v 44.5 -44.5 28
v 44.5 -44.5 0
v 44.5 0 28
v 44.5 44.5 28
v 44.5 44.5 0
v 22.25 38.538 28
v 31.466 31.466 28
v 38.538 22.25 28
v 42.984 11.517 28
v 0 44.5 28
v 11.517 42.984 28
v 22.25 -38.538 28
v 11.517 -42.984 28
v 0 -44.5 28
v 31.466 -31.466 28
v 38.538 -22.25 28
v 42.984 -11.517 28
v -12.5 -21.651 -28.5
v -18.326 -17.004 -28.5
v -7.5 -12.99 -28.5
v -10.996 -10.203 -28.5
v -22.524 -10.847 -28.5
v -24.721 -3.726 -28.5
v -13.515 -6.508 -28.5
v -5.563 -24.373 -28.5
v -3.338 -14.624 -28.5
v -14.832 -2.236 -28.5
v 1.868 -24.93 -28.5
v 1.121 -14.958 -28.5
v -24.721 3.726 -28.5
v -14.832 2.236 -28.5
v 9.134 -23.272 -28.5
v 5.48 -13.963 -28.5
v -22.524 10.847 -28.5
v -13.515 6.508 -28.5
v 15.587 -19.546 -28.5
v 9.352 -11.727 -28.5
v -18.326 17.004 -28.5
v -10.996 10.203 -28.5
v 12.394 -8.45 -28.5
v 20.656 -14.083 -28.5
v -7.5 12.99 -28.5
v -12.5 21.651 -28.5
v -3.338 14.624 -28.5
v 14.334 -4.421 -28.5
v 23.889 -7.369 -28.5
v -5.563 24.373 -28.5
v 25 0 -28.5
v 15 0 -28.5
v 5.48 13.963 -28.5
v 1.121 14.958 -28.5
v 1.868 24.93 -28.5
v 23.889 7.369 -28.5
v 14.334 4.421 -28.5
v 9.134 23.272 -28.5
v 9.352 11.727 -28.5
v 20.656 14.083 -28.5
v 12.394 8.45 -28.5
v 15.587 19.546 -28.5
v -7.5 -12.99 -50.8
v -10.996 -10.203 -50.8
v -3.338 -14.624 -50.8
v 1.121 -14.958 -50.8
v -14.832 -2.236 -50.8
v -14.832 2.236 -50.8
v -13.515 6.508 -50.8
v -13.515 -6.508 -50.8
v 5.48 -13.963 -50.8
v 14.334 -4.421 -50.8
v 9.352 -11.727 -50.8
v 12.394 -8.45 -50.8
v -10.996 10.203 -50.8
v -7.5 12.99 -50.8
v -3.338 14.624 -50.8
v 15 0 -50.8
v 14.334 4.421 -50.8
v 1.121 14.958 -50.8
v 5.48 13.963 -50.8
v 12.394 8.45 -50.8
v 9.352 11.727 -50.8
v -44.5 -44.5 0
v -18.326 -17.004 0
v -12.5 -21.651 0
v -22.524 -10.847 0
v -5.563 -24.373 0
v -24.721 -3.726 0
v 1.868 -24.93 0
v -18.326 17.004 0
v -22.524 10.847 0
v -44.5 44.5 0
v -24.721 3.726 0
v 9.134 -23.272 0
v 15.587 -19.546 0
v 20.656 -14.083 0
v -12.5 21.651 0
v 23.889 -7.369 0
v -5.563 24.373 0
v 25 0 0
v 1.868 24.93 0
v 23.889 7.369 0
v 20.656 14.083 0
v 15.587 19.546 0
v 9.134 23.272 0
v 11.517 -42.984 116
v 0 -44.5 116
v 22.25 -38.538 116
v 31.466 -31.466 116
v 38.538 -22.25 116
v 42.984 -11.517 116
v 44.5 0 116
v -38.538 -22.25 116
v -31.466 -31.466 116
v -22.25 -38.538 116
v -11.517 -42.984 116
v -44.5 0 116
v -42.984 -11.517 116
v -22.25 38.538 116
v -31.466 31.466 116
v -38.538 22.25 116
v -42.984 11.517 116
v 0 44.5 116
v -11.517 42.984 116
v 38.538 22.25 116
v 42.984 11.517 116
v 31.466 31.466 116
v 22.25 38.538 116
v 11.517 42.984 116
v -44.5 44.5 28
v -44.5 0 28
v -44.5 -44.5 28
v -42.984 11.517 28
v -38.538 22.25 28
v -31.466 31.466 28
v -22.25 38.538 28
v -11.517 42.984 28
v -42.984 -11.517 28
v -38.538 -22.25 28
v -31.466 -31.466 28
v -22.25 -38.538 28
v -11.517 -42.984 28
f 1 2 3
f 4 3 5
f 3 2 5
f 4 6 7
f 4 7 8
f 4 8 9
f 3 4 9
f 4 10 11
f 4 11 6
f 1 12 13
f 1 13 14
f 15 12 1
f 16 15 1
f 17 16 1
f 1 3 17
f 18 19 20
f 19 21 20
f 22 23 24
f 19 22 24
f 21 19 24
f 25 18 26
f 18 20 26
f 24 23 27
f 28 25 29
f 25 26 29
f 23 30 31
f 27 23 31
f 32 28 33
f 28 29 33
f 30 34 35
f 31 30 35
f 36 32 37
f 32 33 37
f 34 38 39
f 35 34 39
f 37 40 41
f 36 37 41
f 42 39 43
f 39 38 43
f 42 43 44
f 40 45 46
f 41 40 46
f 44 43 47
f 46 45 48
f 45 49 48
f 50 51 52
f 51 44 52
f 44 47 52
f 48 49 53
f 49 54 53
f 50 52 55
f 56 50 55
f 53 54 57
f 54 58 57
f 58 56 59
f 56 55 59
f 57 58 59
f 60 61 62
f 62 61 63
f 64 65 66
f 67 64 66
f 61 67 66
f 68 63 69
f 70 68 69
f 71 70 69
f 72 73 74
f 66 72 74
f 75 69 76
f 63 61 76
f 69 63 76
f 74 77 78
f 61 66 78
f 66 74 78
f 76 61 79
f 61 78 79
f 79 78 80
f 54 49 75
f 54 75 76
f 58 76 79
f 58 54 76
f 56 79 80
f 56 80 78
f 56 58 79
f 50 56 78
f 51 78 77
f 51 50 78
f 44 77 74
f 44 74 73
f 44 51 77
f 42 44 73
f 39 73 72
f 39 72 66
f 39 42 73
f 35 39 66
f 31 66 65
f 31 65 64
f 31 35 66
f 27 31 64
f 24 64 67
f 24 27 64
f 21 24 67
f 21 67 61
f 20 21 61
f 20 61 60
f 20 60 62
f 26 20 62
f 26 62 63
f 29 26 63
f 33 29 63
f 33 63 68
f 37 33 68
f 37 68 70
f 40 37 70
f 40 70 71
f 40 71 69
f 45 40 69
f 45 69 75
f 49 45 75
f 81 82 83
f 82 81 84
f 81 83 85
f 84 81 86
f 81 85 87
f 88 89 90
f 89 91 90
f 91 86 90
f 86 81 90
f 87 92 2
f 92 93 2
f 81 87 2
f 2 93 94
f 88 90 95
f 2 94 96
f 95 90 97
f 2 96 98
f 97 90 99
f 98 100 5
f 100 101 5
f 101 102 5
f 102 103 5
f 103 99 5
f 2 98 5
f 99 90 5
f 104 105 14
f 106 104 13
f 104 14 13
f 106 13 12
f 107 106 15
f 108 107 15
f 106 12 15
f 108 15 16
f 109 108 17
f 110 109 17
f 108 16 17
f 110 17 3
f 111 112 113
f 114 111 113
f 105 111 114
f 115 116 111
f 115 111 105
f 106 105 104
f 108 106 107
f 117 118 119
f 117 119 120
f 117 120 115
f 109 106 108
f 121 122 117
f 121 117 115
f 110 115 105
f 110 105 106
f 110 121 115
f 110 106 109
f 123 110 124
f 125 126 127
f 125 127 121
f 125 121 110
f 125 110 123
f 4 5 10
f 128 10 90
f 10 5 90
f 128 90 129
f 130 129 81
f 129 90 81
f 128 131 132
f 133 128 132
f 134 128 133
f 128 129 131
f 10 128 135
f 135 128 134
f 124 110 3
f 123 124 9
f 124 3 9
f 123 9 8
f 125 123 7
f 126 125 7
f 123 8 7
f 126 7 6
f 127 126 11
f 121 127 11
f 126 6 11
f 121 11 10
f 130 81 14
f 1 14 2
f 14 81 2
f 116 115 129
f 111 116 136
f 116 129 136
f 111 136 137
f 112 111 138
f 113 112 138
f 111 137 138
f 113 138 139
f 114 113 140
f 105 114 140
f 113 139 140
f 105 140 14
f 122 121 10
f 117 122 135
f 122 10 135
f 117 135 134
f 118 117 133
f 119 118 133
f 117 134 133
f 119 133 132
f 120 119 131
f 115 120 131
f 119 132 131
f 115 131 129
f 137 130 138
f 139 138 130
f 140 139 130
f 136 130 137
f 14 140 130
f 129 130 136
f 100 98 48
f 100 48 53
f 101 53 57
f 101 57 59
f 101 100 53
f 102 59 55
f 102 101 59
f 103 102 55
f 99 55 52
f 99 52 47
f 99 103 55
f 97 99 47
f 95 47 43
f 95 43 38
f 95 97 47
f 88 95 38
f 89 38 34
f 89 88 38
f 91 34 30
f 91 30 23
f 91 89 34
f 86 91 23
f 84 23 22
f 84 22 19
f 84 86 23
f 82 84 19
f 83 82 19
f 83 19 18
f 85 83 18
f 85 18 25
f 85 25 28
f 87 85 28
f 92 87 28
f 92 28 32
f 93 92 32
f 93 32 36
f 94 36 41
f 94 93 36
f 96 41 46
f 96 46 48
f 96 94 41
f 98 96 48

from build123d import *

# Parameters (mm, degrees)
F0_R     = 25
F0_R_2   = 15
F1_DEPTH = 28
F2_DEPTH = 116
F3_DEPTH = 28.5
F4_DEPTH = 50.8


with BuildPart() as f1:
    # F0 (on Top) → F1 (new body)
    with BuildSketch(Plane.XY):
        with BuildLine():
            Line((0, -44.5), (44.5, -44.5))
            Line((44.5, -44.5), (44.5, 0))
            ThreePointArc((44.5, 0), (31.466252, -31.466252), (0, -44.5))
        make_face()
        with BuildLine():
            Line((-44.5, -44.5), (0, -44.5))
            ThreePointArc((0, -44.5), (-31.466252, -31.466252), (-44.5, 0))
            Line((-44.5, 0), (-44.5, -44.5))
        make_face()
        with BuildLine():
            ThreePointArc((0, 44.5), (31.466252, 31.466252), (44.5, 0))
            Line((44.5, 0), (44.5, 44.5))
            Line((44.5, 44.5), (0, 44.5))
        make_face()
        with BuildLine():
            Line((-44.5, 44.5), (-44.5, 0))
            ThreePointArc((-44.5, 0), (-31.466252, 31.466252), (0, 44.5))
            Line((0, 44.5), (-44.5, 44.5))
        make_face()
        Circle(F0_R)
        Circle(F0_R_2, mode=Mode.SUBTRACT)
    extrude(amount=F1_DEPTH)

    # F0 (on Top) → F2 (join)
    with BuildSketch(Plane.XY):
        with BuildLine():
            ThreePointArc((-44.5, 0), (-31.466252, -31.466252), (0, -44.5))
            ThreePointArc((0, -44.5), (31.466252, -31.466252), (44.5, 0))
            ThreePointArc((44.5, 0), (31.466252, 31.466252), (0, 44.5))
            ThreePointArc((0, 44.5), (-31.466252, 31.466252), (-44.5, 0))
        make_face()
        Circle(F0_R, mode=Mode.SUBTRACT)
        Circle(F0_R)
        Circle(F0_R_2, mode=Mode.SUBTRACT)
        Circle(F0_R_2)
    extrude(amount=F2_DEPTH)

    # F0 (on Top) → F3 (join)
    with BuildSketch(Plane.XY):
        Circle(F0_R)
        Circle(F0_R_2, mode=Mode.SUBTRACT)
    extrude(amount=-F3_DEPTH)

    # F0 (on Top) → F4 (join)
    with BuildSketch(Plane.XY):
        Circle(F0_R_2)
    extrude(amount=-F4_DEPTH)


solid = f1.part
